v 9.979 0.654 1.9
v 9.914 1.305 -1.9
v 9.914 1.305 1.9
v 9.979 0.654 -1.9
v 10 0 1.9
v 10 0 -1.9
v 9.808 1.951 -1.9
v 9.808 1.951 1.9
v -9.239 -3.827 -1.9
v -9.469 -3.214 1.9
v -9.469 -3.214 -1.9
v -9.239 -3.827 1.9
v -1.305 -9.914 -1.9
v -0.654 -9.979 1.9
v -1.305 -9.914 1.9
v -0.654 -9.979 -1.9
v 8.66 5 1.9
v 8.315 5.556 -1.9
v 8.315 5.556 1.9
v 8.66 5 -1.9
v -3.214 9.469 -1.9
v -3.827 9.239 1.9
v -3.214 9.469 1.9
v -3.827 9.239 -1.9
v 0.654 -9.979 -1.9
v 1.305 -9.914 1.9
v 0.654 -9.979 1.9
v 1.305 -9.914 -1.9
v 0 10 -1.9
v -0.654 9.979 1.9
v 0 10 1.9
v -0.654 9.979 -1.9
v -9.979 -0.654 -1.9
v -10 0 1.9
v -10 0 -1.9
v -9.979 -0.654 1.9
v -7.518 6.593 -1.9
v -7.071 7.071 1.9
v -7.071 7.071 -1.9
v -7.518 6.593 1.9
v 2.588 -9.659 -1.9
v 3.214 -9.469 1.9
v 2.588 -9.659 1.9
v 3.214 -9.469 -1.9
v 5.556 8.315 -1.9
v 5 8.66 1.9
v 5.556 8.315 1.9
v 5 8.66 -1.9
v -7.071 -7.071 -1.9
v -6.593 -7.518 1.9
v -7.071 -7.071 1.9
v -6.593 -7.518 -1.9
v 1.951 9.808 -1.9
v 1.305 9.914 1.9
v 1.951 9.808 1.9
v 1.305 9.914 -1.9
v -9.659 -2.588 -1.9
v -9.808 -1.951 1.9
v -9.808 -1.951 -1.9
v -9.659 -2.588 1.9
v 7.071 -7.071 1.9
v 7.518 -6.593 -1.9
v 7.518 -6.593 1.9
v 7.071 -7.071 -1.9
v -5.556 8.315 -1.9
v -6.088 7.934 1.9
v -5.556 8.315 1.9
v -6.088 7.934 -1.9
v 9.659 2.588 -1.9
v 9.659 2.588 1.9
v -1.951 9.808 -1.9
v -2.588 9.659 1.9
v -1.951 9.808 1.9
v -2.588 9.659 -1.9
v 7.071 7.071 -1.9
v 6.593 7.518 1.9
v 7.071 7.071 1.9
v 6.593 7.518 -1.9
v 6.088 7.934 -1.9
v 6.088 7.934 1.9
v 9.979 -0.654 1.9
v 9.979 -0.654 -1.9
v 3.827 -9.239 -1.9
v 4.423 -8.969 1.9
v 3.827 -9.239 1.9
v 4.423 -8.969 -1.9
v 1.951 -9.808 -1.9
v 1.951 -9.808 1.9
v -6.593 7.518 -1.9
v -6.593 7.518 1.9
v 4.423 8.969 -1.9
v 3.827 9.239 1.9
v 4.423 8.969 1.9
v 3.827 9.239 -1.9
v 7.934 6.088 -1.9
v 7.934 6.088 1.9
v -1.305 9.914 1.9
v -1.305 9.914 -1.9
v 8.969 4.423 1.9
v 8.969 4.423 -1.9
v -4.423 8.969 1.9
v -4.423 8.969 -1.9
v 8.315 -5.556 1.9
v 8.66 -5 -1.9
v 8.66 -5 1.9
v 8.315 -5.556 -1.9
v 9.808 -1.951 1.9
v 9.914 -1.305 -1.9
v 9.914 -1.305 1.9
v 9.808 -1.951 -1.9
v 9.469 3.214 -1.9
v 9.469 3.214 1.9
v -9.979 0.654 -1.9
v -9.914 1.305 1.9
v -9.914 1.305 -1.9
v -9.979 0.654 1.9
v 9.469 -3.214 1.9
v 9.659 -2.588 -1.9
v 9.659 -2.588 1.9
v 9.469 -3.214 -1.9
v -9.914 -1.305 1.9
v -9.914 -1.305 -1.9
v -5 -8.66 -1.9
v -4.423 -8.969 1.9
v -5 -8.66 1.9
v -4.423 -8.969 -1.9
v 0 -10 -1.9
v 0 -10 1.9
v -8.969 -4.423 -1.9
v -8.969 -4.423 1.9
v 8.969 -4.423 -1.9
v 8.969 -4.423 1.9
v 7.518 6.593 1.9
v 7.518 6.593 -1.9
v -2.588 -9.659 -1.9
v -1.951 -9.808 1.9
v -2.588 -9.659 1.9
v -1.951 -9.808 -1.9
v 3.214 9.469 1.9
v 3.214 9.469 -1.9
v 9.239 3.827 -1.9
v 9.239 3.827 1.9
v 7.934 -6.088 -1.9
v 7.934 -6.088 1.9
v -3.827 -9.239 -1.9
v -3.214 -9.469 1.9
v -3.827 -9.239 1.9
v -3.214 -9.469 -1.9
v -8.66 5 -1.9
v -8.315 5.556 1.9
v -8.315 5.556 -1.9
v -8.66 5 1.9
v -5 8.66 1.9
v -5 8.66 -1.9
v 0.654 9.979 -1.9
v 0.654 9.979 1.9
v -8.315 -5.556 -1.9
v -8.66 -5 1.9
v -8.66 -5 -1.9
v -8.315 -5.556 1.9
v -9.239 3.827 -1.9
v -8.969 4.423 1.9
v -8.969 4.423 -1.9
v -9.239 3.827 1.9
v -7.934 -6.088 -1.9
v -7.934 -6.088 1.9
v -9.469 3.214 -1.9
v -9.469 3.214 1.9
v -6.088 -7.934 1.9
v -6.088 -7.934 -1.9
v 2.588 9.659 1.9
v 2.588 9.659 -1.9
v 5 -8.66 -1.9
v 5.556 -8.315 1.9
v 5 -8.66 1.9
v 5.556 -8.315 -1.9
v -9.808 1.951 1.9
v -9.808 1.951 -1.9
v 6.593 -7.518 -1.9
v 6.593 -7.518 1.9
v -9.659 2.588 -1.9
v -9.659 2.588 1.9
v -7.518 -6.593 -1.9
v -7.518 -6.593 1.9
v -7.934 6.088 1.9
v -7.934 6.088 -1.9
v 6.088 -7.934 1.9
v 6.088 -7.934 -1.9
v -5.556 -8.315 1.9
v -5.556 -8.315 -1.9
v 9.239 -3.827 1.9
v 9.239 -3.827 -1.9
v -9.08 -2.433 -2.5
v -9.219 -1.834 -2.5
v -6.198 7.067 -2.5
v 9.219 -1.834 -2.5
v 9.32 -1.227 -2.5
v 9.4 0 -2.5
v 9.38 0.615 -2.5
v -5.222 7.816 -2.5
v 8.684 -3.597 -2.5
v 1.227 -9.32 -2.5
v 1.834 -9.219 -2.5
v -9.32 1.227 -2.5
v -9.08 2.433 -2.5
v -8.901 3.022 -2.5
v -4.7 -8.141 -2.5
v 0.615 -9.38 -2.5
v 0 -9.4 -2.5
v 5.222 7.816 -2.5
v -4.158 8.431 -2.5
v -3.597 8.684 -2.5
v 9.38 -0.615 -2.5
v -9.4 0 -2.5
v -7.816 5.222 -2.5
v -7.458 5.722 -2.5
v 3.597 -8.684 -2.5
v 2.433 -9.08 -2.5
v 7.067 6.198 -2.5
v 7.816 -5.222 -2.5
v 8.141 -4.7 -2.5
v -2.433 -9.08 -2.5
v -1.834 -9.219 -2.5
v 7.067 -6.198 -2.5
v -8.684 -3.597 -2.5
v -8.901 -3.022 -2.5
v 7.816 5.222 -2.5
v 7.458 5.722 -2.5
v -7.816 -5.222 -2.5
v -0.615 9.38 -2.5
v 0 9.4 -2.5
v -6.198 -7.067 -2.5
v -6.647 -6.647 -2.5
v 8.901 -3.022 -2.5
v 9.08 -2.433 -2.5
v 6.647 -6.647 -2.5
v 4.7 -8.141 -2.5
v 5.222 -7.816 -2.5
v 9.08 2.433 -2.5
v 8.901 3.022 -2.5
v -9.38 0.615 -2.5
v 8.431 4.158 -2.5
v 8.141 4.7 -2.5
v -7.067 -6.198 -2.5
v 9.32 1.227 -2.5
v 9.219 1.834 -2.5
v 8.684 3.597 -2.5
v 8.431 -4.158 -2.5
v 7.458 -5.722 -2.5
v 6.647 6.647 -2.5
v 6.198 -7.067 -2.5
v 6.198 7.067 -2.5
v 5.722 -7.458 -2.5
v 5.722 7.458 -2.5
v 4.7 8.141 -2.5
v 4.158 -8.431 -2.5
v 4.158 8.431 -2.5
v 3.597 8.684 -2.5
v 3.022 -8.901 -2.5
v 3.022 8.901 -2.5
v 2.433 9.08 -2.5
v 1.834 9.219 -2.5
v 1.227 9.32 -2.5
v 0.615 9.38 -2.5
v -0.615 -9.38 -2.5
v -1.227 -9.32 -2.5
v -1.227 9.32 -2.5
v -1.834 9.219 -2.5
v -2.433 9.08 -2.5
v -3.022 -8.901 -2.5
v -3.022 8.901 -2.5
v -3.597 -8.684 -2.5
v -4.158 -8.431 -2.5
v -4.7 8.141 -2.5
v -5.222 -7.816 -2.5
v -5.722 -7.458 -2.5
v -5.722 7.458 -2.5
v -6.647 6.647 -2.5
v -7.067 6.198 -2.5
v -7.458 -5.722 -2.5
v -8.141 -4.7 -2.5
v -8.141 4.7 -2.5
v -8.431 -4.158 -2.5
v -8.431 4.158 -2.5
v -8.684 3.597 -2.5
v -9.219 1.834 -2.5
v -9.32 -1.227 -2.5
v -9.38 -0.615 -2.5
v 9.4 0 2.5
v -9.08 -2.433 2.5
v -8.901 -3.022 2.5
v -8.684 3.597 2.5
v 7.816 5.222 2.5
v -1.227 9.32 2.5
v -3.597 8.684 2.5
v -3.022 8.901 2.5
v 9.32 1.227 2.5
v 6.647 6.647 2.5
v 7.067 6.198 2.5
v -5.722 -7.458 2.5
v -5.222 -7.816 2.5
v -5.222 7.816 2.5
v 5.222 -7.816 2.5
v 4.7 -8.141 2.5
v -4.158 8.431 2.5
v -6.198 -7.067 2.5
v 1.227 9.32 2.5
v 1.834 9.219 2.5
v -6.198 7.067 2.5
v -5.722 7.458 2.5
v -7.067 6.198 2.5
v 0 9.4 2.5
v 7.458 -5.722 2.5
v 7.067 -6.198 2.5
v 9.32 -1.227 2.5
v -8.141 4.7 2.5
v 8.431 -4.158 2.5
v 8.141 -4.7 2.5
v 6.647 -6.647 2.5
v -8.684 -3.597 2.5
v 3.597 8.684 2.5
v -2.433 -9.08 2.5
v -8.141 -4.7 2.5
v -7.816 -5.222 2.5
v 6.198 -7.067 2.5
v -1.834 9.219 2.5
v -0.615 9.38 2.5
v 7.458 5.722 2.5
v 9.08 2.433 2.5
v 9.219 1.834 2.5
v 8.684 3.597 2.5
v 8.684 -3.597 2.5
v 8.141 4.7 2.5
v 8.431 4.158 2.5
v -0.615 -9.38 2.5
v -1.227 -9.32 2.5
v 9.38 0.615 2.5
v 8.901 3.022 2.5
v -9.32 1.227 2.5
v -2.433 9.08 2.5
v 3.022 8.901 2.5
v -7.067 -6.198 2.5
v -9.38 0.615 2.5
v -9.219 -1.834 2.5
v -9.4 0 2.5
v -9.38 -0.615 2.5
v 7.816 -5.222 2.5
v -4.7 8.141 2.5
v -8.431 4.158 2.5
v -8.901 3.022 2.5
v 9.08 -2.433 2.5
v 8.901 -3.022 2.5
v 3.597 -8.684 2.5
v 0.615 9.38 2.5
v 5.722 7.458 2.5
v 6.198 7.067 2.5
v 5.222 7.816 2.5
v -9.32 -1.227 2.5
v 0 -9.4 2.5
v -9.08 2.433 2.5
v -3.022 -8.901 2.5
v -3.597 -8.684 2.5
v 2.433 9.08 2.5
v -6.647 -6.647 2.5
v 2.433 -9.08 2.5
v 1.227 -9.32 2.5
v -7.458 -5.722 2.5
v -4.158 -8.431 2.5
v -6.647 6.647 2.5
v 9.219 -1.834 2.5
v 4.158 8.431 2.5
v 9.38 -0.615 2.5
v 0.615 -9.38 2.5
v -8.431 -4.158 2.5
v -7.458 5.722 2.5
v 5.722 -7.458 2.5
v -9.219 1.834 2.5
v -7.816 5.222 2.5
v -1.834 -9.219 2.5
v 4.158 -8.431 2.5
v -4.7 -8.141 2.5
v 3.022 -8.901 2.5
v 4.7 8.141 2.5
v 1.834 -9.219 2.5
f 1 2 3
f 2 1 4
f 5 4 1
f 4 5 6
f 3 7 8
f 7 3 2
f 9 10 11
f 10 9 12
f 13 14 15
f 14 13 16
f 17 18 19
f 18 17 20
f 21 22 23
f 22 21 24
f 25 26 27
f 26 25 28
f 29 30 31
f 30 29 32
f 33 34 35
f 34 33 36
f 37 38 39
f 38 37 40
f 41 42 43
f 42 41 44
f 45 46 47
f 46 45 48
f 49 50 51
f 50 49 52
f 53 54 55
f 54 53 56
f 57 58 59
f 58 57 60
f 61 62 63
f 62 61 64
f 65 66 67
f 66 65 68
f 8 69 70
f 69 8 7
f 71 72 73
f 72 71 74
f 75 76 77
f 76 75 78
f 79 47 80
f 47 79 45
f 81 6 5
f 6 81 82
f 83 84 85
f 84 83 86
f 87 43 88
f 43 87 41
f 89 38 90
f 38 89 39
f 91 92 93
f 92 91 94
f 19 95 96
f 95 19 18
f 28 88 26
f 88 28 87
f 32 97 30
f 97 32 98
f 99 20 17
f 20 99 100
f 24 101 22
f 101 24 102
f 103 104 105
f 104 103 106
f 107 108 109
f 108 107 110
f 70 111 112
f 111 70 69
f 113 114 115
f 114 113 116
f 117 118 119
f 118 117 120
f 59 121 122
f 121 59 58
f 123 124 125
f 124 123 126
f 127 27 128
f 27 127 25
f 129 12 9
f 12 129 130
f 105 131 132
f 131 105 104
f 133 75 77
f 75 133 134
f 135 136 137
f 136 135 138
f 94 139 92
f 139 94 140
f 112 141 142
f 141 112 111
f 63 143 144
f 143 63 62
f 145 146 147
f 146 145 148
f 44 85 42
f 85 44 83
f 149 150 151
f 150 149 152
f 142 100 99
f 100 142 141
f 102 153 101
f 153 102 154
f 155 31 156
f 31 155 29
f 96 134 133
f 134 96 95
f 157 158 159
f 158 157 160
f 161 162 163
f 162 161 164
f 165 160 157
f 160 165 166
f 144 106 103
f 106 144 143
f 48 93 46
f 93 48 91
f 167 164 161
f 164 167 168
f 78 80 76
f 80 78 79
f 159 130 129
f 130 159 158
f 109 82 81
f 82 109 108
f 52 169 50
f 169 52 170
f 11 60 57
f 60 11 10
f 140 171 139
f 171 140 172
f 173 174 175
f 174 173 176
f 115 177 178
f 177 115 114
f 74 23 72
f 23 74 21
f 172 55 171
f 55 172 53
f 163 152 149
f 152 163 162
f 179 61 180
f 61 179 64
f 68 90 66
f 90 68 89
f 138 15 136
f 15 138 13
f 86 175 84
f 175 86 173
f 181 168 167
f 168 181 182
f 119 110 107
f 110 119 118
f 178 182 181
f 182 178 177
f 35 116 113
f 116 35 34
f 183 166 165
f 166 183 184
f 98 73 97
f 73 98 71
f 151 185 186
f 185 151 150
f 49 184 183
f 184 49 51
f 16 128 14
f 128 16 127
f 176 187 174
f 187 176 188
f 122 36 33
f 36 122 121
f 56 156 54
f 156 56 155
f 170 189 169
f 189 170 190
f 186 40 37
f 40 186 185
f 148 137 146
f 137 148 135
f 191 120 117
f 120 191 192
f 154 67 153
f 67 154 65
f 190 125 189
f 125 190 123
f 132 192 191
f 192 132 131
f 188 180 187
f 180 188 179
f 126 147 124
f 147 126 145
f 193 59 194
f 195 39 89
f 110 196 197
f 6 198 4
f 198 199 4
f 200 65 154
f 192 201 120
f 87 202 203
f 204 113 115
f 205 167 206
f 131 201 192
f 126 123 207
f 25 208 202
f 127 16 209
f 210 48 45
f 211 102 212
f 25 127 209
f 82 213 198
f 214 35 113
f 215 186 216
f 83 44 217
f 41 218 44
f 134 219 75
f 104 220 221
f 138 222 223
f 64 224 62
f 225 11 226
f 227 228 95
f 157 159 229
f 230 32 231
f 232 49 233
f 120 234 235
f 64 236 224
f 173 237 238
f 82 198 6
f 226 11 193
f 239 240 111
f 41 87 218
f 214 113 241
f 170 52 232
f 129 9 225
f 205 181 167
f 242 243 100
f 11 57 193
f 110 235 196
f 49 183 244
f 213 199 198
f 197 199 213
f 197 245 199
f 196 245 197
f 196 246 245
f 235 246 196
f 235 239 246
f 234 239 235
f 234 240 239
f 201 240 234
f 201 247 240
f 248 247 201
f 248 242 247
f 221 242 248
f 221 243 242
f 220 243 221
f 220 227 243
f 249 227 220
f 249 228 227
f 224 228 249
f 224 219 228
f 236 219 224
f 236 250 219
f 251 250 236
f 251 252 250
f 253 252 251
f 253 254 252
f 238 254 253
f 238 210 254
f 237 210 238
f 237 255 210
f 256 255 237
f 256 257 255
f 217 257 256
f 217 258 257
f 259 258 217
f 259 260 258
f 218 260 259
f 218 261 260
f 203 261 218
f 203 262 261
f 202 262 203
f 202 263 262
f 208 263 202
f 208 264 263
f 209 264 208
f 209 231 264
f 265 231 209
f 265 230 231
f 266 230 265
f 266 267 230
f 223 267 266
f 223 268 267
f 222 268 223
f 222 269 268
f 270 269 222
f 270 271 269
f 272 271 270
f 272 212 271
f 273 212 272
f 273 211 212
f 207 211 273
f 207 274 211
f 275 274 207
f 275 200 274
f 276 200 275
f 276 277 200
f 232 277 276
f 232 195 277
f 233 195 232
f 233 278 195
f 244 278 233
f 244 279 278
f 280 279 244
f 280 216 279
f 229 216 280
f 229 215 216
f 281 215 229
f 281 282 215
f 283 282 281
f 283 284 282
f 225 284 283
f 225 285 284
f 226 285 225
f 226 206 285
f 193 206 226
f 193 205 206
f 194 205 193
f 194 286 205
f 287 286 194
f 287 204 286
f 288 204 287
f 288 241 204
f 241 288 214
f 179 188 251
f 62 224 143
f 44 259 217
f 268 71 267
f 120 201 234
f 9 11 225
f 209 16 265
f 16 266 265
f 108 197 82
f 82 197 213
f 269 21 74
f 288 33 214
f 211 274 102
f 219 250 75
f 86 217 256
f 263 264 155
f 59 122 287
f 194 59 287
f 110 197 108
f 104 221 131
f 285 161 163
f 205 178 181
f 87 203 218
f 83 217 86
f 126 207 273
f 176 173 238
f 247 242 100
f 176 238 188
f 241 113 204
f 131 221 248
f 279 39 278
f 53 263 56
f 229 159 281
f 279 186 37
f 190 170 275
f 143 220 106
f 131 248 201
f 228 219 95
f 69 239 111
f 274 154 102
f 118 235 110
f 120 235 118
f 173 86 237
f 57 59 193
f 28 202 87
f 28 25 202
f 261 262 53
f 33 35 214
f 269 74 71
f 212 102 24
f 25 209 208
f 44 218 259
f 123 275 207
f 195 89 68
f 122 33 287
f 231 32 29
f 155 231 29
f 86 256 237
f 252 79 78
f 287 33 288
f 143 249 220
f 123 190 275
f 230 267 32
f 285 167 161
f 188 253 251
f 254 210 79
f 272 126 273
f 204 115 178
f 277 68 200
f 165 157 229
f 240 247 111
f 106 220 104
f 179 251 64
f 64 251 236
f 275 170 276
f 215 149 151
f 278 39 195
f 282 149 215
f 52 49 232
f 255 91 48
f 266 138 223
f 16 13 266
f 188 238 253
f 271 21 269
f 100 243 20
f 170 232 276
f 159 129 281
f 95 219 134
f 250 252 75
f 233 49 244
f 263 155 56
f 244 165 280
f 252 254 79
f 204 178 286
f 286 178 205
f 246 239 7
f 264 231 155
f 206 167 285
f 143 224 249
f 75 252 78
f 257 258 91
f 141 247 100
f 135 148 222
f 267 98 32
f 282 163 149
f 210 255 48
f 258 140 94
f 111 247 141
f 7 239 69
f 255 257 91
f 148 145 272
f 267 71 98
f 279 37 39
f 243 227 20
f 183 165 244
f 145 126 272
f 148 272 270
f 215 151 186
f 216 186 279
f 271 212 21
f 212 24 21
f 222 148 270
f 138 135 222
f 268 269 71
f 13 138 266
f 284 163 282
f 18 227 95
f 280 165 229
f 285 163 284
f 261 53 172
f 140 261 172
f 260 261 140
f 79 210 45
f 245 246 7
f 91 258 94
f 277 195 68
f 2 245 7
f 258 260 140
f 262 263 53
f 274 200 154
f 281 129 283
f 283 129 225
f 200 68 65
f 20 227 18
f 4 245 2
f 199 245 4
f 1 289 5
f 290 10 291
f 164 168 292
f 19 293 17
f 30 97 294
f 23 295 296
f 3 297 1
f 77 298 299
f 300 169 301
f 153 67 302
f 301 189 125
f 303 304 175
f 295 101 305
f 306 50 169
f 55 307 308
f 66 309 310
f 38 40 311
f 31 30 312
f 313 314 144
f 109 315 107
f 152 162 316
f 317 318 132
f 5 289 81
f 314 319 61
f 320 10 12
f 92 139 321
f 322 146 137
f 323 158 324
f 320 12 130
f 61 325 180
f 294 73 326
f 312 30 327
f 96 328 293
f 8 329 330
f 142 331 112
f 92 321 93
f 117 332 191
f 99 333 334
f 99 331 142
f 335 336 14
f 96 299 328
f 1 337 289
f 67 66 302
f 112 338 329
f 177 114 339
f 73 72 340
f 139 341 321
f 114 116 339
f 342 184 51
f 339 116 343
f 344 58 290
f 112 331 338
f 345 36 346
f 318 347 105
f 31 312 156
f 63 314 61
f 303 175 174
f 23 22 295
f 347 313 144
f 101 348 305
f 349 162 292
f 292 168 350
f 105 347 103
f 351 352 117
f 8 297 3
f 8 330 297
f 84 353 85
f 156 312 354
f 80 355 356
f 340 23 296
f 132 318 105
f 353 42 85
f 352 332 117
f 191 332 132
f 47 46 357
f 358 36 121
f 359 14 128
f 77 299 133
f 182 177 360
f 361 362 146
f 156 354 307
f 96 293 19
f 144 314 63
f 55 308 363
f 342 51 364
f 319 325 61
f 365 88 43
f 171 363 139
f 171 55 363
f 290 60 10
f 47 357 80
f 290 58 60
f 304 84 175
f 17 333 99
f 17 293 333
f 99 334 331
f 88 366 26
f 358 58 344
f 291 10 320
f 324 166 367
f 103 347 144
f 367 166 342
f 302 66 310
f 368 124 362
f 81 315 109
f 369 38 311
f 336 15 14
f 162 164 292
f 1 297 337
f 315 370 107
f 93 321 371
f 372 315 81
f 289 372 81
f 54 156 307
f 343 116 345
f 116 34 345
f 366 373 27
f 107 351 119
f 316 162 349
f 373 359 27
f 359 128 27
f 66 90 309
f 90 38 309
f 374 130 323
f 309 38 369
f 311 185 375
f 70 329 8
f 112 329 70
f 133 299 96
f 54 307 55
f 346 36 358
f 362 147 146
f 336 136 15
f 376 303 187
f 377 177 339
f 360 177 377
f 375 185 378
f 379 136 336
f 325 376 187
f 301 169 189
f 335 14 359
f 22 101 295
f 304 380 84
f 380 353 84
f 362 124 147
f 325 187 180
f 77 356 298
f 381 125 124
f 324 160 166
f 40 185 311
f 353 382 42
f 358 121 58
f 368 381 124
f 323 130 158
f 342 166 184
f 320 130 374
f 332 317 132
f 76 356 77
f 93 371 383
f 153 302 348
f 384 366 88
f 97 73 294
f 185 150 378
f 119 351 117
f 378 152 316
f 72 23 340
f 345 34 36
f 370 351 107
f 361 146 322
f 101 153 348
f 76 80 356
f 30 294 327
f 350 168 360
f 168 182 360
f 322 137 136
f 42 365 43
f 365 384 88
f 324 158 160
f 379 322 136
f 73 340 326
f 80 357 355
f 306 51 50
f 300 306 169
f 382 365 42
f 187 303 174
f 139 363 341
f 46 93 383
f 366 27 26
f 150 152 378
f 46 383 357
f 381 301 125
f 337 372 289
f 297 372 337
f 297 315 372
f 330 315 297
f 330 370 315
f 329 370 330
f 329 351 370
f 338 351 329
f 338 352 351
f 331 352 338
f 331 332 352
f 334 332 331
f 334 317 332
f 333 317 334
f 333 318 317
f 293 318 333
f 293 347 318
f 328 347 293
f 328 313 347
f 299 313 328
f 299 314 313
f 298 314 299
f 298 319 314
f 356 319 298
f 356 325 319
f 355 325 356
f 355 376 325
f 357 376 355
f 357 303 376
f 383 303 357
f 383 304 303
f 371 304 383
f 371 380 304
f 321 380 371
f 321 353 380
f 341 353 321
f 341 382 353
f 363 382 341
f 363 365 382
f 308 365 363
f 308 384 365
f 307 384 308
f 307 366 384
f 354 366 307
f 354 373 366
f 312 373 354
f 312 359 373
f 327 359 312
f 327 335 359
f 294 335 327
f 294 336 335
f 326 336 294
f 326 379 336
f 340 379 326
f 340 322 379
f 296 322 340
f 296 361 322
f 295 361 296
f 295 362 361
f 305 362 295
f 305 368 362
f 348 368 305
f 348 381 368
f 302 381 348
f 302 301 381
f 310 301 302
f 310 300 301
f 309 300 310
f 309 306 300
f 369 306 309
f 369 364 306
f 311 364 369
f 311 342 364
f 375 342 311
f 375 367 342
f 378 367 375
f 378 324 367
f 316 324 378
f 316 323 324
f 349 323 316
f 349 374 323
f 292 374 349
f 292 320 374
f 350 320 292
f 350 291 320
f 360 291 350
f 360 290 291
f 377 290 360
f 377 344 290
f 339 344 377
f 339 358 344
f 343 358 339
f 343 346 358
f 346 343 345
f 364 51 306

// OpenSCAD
$fn=96;

magnet_d = 20;
magnet_h = 5;
edge_chamfer = 0.6;

module chamfered_cylinder(d=20, h=5, c=0.6) {
    c2 = min(c, h/2 - 0.01);
    union() {
        translate([0,0,-h/2 + c2])
            cylinder(d=d, h=h - 2*c2, center=false);
        translate([0,0,-h/2])
            cylinder(d1=d - 2*c2, d2=d, h=c2, center=false);
        translate([0,0,h/2 - c2])
            cylinder(d1=d, d2=d - 2*c2, h=c2, center=false);
    }
}

module magnet(d=20, h=5, c=0.6) {
    chamfered_cylinder(d=d, h=h, c=c);
}

magnet(d=magnet_d, h=magnet_h, c=edge_chamfer);
